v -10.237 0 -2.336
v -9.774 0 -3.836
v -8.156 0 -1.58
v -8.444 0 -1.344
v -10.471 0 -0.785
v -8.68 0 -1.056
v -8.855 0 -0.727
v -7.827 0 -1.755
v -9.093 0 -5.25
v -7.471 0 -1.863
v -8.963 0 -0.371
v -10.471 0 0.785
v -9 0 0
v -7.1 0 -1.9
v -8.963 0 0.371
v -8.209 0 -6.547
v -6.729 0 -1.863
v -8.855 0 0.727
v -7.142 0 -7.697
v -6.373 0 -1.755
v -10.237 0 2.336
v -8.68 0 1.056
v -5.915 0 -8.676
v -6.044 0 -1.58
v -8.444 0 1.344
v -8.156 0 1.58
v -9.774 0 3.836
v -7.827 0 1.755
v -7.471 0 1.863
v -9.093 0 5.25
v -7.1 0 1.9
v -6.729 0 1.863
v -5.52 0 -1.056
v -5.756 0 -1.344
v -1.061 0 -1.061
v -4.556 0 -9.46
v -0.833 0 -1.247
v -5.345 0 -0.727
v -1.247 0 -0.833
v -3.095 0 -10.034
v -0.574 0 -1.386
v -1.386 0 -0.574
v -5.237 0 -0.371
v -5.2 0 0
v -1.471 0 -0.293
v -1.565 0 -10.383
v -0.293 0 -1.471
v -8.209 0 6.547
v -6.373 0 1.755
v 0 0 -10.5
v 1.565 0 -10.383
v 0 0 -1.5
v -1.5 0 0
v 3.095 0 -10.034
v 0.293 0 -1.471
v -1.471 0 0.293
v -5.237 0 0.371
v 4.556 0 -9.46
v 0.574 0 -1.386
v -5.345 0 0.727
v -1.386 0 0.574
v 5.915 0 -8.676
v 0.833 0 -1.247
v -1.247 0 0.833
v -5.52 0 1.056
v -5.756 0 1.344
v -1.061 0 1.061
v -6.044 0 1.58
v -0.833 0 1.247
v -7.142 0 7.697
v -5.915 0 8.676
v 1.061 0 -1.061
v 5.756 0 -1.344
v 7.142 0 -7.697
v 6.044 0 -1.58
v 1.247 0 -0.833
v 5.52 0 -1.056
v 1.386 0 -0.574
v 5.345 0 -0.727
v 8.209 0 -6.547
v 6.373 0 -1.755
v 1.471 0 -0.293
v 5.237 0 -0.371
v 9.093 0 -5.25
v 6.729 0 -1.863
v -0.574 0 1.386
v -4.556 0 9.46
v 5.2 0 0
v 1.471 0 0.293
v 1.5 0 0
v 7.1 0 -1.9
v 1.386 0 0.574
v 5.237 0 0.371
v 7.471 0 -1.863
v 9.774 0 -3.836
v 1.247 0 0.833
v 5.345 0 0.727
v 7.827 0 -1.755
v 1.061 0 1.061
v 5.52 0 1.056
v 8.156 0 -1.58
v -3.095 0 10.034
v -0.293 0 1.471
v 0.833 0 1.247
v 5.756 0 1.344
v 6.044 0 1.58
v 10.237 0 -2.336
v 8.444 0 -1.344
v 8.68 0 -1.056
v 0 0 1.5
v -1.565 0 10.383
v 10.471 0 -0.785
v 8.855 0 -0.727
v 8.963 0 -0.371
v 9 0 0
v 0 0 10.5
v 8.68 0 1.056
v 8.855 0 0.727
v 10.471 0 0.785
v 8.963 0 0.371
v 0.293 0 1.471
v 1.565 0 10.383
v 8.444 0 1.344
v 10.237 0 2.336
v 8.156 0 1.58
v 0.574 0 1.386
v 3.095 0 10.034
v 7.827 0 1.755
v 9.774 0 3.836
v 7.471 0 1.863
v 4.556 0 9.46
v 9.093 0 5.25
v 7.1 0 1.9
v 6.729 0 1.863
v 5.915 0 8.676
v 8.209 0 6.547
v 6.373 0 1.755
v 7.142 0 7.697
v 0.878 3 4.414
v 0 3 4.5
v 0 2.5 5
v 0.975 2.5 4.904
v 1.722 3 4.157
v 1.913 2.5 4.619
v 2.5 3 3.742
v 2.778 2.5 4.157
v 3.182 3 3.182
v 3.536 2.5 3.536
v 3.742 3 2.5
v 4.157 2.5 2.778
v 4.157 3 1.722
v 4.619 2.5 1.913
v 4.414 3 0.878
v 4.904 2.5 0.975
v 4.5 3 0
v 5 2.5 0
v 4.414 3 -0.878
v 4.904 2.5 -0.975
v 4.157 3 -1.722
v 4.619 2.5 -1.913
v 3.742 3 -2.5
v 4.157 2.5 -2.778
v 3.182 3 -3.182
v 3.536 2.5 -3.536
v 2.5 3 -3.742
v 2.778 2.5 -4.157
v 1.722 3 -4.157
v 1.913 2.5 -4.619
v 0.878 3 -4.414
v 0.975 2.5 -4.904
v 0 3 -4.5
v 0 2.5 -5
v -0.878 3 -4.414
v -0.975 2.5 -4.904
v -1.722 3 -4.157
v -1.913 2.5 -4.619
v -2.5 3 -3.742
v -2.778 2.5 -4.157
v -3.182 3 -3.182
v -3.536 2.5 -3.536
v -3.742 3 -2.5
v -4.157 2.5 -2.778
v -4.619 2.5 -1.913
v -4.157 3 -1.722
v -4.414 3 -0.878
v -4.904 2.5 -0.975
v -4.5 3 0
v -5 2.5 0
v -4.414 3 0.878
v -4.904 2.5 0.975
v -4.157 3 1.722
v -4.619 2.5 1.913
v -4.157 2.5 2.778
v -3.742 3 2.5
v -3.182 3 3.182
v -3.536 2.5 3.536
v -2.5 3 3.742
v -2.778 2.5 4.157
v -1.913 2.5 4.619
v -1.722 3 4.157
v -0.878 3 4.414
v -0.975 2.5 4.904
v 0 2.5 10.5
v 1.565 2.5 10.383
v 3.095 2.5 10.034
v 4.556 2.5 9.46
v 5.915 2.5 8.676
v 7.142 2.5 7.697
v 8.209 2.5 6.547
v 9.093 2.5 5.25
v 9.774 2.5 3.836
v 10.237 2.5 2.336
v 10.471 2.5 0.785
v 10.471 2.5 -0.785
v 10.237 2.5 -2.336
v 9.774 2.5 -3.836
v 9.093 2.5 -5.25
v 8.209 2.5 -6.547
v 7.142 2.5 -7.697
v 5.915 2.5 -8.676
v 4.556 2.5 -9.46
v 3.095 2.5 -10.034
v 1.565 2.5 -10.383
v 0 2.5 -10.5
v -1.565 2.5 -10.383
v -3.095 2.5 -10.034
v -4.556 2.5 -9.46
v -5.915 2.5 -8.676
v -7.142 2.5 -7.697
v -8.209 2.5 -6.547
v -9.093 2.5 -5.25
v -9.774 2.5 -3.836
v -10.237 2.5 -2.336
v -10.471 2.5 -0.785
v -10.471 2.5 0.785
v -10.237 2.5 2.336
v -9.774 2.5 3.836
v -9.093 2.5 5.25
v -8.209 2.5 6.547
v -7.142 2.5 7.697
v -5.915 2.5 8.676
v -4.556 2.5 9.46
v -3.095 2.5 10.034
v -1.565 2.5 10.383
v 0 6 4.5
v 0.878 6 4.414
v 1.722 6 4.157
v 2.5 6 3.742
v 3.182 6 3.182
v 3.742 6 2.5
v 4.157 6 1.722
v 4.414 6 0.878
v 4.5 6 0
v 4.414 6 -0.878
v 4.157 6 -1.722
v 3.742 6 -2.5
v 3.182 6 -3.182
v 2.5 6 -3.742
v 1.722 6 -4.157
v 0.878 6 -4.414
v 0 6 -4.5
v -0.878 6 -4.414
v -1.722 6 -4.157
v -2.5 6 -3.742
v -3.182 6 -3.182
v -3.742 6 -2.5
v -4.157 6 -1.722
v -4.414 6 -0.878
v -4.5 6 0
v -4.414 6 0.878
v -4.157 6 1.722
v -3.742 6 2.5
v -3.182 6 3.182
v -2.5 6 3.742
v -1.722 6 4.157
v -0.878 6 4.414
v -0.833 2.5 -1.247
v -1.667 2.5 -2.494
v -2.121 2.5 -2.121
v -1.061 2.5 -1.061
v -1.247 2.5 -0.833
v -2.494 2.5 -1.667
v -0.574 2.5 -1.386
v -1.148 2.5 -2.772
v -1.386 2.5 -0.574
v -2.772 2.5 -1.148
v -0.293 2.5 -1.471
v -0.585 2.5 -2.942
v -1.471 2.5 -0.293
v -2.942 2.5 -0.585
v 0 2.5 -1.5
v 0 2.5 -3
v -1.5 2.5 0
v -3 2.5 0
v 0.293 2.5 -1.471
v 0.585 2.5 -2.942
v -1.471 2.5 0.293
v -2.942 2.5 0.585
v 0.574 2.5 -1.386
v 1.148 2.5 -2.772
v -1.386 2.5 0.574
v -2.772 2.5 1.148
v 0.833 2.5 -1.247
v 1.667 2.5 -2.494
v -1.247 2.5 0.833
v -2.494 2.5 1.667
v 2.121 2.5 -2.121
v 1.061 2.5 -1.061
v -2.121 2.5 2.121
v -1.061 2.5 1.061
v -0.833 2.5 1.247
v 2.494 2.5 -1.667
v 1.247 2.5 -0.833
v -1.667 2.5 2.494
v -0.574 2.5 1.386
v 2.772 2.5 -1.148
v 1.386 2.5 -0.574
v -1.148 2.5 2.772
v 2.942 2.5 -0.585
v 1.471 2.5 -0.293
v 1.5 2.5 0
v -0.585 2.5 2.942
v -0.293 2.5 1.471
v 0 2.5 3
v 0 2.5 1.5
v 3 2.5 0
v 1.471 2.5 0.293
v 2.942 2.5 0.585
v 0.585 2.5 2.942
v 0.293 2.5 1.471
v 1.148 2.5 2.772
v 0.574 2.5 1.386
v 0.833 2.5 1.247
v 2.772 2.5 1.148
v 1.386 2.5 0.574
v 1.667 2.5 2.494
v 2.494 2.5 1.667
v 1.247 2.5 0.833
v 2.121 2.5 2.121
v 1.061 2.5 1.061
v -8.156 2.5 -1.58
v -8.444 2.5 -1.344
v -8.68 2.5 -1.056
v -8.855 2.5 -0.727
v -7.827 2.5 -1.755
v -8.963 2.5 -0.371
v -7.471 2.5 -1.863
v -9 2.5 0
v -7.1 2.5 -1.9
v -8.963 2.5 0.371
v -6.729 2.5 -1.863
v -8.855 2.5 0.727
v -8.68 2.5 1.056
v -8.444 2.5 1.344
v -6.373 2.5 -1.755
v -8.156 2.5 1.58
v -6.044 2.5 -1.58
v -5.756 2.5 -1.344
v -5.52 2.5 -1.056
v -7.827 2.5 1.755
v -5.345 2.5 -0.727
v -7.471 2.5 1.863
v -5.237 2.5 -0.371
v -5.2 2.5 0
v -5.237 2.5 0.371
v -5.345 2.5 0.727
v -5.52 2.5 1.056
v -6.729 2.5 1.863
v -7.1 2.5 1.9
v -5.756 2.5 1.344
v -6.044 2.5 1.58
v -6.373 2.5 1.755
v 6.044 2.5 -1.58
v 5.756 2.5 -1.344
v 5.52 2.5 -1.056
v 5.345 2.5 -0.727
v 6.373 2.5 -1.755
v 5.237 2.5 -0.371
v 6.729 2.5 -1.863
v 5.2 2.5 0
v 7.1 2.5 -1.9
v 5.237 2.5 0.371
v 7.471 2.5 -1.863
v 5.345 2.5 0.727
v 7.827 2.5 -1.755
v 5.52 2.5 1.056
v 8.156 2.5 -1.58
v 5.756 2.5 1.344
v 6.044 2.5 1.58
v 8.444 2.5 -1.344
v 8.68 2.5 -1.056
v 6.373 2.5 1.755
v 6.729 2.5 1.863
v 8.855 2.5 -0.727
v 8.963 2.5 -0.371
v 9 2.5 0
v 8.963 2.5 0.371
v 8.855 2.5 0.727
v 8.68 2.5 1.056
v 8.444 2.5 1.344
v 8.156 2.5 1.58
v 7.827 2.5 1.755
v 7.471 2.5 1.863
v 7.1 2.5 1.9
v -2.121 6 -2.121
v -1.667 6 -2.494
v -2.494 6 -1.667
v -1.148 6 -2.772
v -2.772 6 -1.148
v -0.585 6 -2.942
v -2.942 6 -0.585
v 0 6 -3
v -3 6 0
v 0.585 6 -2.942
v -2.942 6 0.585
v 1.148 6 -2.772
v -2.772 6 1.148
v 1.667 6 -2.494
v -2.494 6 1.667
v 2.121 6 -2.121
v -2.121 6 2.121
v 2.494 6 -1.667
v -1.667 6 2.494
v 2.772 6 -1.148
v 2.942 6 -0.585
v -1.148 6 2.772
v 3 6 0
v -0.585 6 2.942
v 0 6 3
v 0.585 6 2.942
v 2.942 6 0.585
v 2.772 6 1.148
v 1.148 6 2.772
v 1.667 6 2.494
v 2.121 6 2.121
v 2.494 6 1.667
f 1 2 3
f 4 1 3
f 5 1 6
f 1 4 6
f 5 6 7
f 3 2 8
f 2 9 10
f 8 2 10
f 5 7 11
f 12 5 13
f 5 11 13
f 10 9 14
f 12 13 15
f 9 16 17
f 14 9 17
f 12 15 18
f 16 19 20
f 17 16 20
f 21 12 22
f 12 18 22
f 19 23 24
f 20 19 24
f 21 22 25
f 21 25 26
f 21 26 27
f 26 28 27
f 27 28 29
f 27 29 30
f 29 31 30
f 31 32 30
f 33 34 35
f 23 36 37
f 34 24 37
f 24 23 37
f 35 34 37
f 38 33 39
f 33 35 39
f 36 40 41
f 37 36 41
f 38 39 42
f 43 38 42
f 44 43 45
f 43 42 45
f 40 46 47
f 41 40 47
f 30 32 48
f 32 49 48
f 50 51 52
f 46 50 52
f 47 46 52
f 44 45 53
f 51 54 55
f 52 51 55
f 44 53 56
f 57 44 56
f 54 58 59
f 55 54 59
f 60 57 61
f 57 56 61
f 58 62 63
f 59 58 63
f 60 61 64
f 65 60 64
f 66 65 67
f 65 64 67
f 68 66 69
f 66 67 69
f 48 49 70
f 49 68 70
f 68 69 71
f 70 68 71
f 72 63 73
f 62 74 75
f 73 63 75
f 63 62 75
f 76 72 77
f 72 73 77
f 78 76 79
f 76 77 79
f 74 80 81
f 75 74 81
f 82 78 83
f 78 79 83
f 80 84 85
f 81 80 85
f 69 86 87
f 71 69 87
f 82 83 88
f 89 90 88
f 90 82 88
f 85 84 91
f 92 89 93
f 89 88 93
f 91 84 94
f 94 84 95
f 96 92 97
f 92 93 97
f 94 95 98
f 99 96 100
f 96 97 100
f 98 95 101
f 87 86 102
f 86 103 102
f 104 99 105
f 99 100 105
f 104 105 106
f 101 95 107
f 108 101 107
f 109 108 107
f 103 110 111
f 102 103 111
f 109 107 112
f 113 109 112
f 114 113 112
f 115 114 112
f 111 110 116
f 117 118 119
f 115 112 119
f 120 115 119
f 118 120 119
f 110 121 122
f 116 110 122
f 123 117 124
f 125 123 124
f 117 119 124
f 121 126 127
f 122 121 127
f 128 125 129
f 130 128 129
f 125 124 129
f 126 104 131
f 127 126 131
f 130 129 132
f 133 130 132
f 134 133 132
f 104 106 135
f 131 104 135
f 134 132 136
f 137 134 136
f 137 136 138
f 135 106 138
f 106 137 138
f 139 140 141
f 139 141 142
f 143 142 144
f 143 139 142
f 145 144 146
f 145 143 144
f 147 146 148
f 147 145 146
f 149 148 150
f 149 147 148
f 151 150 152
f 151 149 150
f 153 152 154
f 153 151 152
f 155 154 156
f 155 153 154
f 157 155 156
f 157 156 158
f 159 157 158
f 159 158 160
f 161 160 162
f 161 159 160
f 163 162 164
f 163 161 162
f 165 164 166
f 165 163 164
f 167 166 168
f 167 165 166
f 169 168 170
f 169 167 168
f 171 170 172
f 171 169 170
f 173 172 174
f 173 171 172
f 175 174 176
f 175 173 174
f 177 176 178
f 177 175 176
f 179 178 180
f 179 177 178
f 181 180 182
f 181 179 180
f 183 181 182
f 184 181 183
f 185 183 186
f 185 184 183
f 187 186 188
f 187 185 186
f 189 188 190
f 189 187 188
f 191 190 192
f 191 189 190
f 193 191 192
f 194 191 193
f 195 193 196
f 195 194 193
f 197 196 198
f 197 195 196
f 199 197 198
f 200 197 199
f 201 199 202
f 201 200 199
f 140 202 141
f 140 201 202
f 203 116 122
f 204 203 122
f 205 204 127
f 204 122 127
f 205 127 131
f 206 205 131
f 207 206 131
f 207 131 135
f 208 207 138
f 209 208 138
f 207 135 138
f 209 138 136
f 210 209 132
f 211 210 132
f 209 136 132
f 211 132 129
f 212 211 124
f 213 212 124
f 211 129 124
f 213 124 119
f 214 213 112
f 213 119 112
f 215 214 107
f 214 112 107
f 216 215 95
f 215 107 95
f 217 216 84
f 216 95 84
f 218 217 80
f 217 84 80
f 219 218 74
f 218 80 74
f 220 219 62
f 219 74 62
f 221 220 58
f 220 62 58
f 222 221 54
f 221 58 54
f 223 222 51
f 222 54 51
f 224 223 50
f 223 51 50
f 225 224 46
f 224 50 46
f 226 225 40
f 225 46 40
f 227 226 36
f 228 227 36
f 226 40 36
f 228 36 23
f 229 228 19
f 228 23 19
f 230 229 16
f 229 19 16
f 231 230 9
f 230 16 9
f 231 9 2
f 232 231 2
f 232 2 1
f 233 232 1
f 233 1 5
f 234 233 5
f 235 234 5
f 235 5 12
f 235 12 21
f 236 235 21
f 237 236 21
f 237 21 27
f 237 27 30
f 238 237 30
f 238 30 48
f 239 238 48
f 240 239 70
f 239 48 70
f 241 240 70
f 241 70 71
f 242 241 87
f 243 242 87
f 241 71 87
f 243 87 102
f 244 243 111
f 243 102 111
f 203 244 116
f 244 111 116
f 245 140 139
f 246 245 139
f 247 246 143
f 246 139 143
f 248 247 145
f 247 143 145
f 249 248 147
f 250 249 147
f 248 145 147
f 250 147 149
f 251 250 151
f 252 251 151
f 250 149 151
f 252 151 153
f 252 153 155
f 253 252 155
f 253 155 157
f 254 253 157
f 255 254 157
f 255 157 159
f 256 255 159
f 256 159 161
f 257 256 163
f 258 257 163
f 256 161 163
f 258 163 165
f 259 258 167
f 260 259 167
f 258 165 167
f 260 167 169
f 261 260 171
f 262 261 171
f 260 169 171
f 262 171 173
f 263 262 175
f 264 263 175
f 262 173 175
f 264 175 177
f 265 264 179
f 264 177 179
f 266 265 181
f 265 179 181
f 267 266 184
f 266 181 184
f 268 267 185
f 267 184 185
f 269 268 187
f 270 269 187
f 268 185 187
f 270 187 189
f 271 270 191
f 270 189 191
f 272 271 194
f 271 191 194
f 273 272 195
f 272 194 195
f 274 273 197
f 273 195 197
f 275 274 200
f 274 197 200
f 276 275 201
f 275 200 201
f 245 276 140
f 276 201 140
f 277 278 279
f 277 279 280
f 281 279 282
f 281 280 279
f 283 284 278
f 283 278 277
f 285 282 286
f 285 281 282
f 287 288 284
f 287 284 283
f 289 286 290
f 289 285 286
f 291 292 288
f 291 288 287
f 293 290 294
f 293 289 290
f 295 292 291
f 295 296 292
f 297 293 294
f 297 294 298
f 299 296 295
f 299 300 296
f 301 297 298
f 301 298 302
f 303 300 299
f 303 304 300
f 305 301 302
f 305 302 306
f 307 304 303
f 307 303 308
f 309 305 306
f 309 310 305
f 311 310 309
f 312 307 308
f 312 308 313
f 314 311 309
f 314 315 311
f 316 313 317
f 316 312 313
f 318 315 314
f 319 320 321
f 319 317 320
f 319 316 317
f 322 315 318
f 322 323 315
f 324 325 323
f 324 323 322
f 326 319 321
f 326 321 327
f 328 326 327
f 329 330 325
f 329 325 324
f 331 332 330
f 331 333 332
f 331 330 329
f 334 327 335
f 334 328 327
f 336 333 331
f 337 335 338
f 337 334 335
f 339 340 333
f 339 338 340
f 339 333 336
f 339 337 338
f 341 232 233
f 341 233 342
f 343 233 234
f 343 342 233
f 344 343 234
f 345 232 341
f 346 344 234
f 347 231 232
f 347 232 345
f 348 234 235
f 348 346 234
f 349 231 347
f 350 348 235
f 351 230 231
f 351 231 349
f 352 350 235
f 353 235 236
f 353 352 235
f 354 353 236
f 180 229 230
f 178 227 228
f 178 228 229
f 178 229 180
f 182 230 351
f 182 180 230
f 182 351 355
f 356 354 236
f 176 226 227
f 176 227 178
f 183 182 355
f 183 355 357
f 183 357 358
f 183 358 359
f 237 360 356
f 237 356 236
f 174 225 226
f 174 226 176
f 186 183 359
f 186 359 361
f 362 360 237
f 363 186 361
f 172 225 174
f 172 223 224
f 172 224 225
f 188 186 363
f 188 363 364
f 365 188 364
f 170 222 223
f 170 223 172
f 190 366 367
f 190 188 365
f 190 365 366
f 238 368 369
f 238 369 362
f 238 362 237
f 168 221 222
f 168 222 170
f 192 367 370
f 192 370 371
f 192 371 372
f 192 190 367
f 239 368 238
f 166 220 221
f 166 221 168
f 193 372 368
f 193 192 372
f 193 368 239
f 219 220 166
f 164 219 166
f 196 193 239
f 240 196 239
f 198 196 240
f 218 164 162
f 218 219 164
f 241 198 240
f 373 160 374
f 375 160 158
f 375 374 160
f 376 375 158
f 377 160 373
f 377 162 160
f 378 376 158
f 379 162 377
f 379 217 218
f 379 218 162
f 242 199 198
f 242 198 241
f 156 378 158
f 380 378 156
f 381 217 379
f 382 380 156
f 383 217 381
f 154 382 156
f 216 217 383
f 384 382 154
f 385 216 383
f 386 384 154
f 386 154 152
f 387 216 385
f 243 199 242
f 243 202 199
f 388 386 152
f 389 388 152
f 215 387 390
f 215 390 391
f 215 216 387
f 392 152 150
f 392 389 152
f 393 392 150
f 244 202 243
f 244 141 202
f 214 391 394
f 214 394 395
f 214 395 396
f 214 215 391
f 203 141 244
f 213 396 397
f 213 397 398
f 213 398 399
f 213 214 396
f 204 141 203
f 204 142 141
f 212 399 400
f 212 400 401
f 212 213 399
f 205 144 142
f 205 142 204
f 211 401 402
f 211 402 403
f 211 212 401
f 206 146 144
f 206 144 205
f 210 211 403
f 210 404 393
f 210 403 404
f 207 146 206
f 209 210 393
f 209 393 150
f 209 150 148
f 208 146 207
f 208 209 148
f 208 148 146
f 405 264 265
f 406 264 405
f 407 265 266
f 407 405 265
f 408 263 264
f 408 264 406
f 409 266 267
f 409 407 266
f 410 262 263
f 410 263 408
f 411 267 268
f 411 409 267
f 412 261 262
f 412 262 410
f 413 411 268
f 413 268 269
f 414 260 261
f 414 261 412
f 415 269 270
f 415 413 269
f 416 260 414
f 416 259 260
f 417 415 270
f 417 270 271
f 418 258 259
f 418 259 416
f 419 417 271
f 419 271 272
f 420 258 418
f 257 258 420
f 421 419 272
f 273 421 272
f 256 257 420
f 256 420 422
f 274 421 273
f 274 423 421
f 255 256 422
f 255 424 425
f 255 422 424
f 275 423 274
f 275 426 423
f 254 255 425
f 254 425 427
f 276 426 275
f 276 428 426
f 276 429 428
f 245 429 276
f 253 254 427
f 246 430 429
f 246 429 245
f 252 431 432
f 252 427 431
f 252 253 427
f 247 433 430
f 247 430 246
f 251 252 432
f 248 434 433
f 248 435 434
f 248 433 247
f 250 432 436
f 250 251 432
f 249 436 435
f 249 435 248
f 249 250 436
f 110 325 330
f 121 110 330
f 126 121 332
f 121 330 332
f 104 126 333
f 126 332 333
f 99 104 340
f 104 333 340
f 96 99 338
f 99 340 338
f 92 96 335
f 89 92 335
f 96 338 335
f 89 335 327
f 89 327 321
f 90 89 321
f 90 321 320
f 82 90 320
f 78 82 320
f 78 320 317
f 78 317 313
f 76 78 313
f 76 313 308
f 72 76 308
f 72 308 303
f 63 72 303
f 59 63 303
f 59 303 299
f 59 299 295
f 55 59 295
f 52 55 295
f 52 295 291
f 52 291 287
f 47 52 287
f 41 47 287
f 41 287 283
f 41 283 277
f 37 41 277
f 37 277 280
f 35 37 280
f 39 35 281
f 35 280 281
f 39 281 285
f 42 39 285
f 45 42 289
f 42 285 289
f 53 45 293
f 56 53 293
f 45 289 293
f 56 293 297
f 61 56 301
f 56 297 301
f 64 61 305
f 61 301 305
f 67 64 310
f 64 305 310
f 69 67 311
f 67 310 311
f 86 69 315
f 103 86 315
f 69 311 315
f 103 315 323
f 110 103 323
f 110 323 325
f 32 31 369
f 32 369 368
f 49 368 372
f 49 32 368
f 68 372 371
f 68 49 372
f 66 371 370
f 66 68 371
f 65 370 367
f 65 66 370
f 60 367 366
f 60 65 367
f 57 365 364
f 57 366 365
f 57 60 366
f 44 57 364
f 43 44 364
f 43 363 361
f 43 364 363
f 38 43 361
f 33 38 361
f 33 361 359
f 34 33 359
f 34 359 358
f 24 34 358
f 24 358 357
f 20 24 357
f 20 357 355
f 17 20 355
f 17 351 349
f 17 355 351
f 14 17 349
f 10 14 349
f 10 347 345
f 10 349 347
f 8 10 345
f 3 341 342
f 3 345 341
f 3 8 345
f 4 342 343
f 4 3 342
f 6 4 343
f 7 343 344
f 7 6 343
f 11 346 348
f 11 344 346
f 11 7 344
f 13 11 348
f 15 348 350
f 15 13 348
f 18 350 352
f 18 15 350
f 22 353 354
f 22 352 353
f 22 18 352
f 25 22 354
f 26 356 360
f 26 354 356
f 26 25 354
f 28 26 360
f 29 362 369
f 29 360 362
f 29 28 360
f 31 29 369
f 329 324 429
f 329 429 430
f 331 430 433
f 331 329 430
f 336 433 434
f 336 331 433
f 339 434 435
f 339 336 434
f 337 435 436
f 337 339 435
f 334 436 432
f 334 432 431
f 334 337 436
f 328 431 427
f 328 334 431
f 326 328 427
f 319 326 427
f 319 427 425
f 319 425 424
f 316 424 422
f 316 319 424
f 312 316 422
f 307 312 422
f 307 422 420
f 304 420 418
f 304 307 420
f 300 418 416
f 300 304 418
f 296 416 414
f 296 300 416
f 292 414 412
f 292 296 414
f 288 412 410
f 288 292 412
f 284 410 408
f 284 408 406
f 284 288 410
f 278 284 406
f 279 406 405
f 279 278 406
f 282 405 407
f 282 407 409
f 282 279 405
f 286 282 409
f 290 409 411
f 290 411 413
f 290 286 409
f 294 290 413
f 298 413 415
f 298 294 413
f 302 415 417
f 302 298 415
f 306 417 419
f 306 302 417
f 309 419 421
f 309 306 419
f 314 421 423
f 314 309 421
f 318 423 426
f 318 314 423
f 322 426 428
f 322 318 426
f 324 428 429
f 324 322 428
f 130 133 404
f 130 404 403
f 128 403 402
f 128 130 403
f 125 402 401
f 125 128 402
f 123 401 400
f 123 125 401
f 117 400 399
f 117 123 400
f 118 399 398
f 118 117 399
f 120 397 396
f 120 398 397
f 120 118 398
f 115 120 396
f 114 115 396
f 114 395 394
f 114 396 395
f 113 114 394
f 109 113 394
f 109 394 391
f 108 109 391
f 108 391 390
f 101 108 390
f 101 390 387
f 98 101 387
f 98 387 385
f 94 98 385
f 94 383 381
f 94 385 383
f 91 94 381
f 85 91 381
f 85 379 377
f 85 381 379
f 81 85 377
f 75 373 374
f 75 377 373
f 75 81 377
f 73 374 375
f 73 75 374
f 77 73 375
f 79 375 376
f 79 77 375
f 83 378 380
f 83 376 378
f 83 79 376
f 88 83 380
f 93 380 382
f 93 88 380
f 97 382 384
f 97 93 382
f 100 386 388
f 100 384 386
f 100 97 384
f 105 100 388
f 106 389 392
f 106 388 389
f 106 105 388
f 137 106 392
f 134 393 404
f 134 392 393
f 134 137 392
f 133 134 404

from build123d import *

# Parameters (mm, degrees)
SKETCH1_R               = 10.5
BOSS_EXTRUDE1_DEPTH     = 2.5
SKETCH2_R               = 4.5
SKETCH2_R_2             = 3
BOSS_EXTRUDE2_DEPTH     = 3.5
SKETCH4_R               = 1.5
CUT_EXTRUDE1_DEPTH      = 3.5
CUT_EXTRUDE2_DEPTH      = 16.256146302
CUT_EXTRUDE2_DEPTH_BACK = 16.256146302
SKETCH5_R               = 1.9
CHAMFER1_SIZE           = 0.5


with BuildPart() as part:
    # Sketch1 → Boss-Extrude1 (new body)
    with BuildSketch(Plane(origin=(0, 0, 0), x_dir=(1, 0, 0), z_dir=(0, 1, 0))):
        with Locations(Location((0, 0, 0), (0, 0, 270))):
            Circle(SKETCH1_R)
    extrude(amount=BOSS_EXTRUDE1_DEPTH)

    # Sketch2 → Boss-Extrude2 (add)
    with BuildSketch(Plane(origin=(0, 2.5, 0), x_dir=(1, 0, 0), z_dir=(0, 1, 0))):
        with Locations(Location((0, 0, 0), (0, 0, 270))):
            Circle(SKETCH2_R)
        with Locations(Location((0, 0, 0), (0, 0, 270))):
            Circle(SKETCH2_R_2, mode=Mode.SUBTRACT)
    extrude(amount=BOSS_EXTRUDE2_DEPTH)

    # Sketch4 → Cut-Extrude1 (cut)
    with BuildSketch(Plane(origin=(0, 2.5, 0), x_dir=(1, 0, 0), z_dir=(0, 1, 0))):
        with Locations(Location((0, 0, 0), (0, 0, 270))):
            Circle(SKETCH4_R)
    extrude(amount=-CUT_EXTRUDE1_DEPTH, mode=Mode.SUBTRACT)

    # Sketch5 → Cut-Extrude2 (cut, two sides: drawn at the far end of the back side and taken through both)
    with BuildSketch(Plane(origin=(0, 2.5, 0), x_dir=(1, 0, 0), z_dir=(0, 1, 0)).offset(-CUT_EXTRUDE2_DEPTH_BACK)):
        with Locations(Location((-7.1, 0, 0), (0, 0, 270))):
            Circle(SKETCH5_R)
        with Locations(Location((7.1, 0, 0), (0, 0, 270))):
            Circle(SKETCH5_R)
    extrude(amount=CUT_EXTRUDE2_DEPTH + CUT_EXTRUDE2_DEPTH_BACK, mode=Mode.SUBTRACT)

    # Chamfer1
    chamfer1_edges = [part.edges().sort_by_distance(p)[0] for p in [
        (0, 2.5, -4.5),
    ]]
    chamfer(chamfer1_edges, length=CHAMFER1_SIZE)


solid = part.part
